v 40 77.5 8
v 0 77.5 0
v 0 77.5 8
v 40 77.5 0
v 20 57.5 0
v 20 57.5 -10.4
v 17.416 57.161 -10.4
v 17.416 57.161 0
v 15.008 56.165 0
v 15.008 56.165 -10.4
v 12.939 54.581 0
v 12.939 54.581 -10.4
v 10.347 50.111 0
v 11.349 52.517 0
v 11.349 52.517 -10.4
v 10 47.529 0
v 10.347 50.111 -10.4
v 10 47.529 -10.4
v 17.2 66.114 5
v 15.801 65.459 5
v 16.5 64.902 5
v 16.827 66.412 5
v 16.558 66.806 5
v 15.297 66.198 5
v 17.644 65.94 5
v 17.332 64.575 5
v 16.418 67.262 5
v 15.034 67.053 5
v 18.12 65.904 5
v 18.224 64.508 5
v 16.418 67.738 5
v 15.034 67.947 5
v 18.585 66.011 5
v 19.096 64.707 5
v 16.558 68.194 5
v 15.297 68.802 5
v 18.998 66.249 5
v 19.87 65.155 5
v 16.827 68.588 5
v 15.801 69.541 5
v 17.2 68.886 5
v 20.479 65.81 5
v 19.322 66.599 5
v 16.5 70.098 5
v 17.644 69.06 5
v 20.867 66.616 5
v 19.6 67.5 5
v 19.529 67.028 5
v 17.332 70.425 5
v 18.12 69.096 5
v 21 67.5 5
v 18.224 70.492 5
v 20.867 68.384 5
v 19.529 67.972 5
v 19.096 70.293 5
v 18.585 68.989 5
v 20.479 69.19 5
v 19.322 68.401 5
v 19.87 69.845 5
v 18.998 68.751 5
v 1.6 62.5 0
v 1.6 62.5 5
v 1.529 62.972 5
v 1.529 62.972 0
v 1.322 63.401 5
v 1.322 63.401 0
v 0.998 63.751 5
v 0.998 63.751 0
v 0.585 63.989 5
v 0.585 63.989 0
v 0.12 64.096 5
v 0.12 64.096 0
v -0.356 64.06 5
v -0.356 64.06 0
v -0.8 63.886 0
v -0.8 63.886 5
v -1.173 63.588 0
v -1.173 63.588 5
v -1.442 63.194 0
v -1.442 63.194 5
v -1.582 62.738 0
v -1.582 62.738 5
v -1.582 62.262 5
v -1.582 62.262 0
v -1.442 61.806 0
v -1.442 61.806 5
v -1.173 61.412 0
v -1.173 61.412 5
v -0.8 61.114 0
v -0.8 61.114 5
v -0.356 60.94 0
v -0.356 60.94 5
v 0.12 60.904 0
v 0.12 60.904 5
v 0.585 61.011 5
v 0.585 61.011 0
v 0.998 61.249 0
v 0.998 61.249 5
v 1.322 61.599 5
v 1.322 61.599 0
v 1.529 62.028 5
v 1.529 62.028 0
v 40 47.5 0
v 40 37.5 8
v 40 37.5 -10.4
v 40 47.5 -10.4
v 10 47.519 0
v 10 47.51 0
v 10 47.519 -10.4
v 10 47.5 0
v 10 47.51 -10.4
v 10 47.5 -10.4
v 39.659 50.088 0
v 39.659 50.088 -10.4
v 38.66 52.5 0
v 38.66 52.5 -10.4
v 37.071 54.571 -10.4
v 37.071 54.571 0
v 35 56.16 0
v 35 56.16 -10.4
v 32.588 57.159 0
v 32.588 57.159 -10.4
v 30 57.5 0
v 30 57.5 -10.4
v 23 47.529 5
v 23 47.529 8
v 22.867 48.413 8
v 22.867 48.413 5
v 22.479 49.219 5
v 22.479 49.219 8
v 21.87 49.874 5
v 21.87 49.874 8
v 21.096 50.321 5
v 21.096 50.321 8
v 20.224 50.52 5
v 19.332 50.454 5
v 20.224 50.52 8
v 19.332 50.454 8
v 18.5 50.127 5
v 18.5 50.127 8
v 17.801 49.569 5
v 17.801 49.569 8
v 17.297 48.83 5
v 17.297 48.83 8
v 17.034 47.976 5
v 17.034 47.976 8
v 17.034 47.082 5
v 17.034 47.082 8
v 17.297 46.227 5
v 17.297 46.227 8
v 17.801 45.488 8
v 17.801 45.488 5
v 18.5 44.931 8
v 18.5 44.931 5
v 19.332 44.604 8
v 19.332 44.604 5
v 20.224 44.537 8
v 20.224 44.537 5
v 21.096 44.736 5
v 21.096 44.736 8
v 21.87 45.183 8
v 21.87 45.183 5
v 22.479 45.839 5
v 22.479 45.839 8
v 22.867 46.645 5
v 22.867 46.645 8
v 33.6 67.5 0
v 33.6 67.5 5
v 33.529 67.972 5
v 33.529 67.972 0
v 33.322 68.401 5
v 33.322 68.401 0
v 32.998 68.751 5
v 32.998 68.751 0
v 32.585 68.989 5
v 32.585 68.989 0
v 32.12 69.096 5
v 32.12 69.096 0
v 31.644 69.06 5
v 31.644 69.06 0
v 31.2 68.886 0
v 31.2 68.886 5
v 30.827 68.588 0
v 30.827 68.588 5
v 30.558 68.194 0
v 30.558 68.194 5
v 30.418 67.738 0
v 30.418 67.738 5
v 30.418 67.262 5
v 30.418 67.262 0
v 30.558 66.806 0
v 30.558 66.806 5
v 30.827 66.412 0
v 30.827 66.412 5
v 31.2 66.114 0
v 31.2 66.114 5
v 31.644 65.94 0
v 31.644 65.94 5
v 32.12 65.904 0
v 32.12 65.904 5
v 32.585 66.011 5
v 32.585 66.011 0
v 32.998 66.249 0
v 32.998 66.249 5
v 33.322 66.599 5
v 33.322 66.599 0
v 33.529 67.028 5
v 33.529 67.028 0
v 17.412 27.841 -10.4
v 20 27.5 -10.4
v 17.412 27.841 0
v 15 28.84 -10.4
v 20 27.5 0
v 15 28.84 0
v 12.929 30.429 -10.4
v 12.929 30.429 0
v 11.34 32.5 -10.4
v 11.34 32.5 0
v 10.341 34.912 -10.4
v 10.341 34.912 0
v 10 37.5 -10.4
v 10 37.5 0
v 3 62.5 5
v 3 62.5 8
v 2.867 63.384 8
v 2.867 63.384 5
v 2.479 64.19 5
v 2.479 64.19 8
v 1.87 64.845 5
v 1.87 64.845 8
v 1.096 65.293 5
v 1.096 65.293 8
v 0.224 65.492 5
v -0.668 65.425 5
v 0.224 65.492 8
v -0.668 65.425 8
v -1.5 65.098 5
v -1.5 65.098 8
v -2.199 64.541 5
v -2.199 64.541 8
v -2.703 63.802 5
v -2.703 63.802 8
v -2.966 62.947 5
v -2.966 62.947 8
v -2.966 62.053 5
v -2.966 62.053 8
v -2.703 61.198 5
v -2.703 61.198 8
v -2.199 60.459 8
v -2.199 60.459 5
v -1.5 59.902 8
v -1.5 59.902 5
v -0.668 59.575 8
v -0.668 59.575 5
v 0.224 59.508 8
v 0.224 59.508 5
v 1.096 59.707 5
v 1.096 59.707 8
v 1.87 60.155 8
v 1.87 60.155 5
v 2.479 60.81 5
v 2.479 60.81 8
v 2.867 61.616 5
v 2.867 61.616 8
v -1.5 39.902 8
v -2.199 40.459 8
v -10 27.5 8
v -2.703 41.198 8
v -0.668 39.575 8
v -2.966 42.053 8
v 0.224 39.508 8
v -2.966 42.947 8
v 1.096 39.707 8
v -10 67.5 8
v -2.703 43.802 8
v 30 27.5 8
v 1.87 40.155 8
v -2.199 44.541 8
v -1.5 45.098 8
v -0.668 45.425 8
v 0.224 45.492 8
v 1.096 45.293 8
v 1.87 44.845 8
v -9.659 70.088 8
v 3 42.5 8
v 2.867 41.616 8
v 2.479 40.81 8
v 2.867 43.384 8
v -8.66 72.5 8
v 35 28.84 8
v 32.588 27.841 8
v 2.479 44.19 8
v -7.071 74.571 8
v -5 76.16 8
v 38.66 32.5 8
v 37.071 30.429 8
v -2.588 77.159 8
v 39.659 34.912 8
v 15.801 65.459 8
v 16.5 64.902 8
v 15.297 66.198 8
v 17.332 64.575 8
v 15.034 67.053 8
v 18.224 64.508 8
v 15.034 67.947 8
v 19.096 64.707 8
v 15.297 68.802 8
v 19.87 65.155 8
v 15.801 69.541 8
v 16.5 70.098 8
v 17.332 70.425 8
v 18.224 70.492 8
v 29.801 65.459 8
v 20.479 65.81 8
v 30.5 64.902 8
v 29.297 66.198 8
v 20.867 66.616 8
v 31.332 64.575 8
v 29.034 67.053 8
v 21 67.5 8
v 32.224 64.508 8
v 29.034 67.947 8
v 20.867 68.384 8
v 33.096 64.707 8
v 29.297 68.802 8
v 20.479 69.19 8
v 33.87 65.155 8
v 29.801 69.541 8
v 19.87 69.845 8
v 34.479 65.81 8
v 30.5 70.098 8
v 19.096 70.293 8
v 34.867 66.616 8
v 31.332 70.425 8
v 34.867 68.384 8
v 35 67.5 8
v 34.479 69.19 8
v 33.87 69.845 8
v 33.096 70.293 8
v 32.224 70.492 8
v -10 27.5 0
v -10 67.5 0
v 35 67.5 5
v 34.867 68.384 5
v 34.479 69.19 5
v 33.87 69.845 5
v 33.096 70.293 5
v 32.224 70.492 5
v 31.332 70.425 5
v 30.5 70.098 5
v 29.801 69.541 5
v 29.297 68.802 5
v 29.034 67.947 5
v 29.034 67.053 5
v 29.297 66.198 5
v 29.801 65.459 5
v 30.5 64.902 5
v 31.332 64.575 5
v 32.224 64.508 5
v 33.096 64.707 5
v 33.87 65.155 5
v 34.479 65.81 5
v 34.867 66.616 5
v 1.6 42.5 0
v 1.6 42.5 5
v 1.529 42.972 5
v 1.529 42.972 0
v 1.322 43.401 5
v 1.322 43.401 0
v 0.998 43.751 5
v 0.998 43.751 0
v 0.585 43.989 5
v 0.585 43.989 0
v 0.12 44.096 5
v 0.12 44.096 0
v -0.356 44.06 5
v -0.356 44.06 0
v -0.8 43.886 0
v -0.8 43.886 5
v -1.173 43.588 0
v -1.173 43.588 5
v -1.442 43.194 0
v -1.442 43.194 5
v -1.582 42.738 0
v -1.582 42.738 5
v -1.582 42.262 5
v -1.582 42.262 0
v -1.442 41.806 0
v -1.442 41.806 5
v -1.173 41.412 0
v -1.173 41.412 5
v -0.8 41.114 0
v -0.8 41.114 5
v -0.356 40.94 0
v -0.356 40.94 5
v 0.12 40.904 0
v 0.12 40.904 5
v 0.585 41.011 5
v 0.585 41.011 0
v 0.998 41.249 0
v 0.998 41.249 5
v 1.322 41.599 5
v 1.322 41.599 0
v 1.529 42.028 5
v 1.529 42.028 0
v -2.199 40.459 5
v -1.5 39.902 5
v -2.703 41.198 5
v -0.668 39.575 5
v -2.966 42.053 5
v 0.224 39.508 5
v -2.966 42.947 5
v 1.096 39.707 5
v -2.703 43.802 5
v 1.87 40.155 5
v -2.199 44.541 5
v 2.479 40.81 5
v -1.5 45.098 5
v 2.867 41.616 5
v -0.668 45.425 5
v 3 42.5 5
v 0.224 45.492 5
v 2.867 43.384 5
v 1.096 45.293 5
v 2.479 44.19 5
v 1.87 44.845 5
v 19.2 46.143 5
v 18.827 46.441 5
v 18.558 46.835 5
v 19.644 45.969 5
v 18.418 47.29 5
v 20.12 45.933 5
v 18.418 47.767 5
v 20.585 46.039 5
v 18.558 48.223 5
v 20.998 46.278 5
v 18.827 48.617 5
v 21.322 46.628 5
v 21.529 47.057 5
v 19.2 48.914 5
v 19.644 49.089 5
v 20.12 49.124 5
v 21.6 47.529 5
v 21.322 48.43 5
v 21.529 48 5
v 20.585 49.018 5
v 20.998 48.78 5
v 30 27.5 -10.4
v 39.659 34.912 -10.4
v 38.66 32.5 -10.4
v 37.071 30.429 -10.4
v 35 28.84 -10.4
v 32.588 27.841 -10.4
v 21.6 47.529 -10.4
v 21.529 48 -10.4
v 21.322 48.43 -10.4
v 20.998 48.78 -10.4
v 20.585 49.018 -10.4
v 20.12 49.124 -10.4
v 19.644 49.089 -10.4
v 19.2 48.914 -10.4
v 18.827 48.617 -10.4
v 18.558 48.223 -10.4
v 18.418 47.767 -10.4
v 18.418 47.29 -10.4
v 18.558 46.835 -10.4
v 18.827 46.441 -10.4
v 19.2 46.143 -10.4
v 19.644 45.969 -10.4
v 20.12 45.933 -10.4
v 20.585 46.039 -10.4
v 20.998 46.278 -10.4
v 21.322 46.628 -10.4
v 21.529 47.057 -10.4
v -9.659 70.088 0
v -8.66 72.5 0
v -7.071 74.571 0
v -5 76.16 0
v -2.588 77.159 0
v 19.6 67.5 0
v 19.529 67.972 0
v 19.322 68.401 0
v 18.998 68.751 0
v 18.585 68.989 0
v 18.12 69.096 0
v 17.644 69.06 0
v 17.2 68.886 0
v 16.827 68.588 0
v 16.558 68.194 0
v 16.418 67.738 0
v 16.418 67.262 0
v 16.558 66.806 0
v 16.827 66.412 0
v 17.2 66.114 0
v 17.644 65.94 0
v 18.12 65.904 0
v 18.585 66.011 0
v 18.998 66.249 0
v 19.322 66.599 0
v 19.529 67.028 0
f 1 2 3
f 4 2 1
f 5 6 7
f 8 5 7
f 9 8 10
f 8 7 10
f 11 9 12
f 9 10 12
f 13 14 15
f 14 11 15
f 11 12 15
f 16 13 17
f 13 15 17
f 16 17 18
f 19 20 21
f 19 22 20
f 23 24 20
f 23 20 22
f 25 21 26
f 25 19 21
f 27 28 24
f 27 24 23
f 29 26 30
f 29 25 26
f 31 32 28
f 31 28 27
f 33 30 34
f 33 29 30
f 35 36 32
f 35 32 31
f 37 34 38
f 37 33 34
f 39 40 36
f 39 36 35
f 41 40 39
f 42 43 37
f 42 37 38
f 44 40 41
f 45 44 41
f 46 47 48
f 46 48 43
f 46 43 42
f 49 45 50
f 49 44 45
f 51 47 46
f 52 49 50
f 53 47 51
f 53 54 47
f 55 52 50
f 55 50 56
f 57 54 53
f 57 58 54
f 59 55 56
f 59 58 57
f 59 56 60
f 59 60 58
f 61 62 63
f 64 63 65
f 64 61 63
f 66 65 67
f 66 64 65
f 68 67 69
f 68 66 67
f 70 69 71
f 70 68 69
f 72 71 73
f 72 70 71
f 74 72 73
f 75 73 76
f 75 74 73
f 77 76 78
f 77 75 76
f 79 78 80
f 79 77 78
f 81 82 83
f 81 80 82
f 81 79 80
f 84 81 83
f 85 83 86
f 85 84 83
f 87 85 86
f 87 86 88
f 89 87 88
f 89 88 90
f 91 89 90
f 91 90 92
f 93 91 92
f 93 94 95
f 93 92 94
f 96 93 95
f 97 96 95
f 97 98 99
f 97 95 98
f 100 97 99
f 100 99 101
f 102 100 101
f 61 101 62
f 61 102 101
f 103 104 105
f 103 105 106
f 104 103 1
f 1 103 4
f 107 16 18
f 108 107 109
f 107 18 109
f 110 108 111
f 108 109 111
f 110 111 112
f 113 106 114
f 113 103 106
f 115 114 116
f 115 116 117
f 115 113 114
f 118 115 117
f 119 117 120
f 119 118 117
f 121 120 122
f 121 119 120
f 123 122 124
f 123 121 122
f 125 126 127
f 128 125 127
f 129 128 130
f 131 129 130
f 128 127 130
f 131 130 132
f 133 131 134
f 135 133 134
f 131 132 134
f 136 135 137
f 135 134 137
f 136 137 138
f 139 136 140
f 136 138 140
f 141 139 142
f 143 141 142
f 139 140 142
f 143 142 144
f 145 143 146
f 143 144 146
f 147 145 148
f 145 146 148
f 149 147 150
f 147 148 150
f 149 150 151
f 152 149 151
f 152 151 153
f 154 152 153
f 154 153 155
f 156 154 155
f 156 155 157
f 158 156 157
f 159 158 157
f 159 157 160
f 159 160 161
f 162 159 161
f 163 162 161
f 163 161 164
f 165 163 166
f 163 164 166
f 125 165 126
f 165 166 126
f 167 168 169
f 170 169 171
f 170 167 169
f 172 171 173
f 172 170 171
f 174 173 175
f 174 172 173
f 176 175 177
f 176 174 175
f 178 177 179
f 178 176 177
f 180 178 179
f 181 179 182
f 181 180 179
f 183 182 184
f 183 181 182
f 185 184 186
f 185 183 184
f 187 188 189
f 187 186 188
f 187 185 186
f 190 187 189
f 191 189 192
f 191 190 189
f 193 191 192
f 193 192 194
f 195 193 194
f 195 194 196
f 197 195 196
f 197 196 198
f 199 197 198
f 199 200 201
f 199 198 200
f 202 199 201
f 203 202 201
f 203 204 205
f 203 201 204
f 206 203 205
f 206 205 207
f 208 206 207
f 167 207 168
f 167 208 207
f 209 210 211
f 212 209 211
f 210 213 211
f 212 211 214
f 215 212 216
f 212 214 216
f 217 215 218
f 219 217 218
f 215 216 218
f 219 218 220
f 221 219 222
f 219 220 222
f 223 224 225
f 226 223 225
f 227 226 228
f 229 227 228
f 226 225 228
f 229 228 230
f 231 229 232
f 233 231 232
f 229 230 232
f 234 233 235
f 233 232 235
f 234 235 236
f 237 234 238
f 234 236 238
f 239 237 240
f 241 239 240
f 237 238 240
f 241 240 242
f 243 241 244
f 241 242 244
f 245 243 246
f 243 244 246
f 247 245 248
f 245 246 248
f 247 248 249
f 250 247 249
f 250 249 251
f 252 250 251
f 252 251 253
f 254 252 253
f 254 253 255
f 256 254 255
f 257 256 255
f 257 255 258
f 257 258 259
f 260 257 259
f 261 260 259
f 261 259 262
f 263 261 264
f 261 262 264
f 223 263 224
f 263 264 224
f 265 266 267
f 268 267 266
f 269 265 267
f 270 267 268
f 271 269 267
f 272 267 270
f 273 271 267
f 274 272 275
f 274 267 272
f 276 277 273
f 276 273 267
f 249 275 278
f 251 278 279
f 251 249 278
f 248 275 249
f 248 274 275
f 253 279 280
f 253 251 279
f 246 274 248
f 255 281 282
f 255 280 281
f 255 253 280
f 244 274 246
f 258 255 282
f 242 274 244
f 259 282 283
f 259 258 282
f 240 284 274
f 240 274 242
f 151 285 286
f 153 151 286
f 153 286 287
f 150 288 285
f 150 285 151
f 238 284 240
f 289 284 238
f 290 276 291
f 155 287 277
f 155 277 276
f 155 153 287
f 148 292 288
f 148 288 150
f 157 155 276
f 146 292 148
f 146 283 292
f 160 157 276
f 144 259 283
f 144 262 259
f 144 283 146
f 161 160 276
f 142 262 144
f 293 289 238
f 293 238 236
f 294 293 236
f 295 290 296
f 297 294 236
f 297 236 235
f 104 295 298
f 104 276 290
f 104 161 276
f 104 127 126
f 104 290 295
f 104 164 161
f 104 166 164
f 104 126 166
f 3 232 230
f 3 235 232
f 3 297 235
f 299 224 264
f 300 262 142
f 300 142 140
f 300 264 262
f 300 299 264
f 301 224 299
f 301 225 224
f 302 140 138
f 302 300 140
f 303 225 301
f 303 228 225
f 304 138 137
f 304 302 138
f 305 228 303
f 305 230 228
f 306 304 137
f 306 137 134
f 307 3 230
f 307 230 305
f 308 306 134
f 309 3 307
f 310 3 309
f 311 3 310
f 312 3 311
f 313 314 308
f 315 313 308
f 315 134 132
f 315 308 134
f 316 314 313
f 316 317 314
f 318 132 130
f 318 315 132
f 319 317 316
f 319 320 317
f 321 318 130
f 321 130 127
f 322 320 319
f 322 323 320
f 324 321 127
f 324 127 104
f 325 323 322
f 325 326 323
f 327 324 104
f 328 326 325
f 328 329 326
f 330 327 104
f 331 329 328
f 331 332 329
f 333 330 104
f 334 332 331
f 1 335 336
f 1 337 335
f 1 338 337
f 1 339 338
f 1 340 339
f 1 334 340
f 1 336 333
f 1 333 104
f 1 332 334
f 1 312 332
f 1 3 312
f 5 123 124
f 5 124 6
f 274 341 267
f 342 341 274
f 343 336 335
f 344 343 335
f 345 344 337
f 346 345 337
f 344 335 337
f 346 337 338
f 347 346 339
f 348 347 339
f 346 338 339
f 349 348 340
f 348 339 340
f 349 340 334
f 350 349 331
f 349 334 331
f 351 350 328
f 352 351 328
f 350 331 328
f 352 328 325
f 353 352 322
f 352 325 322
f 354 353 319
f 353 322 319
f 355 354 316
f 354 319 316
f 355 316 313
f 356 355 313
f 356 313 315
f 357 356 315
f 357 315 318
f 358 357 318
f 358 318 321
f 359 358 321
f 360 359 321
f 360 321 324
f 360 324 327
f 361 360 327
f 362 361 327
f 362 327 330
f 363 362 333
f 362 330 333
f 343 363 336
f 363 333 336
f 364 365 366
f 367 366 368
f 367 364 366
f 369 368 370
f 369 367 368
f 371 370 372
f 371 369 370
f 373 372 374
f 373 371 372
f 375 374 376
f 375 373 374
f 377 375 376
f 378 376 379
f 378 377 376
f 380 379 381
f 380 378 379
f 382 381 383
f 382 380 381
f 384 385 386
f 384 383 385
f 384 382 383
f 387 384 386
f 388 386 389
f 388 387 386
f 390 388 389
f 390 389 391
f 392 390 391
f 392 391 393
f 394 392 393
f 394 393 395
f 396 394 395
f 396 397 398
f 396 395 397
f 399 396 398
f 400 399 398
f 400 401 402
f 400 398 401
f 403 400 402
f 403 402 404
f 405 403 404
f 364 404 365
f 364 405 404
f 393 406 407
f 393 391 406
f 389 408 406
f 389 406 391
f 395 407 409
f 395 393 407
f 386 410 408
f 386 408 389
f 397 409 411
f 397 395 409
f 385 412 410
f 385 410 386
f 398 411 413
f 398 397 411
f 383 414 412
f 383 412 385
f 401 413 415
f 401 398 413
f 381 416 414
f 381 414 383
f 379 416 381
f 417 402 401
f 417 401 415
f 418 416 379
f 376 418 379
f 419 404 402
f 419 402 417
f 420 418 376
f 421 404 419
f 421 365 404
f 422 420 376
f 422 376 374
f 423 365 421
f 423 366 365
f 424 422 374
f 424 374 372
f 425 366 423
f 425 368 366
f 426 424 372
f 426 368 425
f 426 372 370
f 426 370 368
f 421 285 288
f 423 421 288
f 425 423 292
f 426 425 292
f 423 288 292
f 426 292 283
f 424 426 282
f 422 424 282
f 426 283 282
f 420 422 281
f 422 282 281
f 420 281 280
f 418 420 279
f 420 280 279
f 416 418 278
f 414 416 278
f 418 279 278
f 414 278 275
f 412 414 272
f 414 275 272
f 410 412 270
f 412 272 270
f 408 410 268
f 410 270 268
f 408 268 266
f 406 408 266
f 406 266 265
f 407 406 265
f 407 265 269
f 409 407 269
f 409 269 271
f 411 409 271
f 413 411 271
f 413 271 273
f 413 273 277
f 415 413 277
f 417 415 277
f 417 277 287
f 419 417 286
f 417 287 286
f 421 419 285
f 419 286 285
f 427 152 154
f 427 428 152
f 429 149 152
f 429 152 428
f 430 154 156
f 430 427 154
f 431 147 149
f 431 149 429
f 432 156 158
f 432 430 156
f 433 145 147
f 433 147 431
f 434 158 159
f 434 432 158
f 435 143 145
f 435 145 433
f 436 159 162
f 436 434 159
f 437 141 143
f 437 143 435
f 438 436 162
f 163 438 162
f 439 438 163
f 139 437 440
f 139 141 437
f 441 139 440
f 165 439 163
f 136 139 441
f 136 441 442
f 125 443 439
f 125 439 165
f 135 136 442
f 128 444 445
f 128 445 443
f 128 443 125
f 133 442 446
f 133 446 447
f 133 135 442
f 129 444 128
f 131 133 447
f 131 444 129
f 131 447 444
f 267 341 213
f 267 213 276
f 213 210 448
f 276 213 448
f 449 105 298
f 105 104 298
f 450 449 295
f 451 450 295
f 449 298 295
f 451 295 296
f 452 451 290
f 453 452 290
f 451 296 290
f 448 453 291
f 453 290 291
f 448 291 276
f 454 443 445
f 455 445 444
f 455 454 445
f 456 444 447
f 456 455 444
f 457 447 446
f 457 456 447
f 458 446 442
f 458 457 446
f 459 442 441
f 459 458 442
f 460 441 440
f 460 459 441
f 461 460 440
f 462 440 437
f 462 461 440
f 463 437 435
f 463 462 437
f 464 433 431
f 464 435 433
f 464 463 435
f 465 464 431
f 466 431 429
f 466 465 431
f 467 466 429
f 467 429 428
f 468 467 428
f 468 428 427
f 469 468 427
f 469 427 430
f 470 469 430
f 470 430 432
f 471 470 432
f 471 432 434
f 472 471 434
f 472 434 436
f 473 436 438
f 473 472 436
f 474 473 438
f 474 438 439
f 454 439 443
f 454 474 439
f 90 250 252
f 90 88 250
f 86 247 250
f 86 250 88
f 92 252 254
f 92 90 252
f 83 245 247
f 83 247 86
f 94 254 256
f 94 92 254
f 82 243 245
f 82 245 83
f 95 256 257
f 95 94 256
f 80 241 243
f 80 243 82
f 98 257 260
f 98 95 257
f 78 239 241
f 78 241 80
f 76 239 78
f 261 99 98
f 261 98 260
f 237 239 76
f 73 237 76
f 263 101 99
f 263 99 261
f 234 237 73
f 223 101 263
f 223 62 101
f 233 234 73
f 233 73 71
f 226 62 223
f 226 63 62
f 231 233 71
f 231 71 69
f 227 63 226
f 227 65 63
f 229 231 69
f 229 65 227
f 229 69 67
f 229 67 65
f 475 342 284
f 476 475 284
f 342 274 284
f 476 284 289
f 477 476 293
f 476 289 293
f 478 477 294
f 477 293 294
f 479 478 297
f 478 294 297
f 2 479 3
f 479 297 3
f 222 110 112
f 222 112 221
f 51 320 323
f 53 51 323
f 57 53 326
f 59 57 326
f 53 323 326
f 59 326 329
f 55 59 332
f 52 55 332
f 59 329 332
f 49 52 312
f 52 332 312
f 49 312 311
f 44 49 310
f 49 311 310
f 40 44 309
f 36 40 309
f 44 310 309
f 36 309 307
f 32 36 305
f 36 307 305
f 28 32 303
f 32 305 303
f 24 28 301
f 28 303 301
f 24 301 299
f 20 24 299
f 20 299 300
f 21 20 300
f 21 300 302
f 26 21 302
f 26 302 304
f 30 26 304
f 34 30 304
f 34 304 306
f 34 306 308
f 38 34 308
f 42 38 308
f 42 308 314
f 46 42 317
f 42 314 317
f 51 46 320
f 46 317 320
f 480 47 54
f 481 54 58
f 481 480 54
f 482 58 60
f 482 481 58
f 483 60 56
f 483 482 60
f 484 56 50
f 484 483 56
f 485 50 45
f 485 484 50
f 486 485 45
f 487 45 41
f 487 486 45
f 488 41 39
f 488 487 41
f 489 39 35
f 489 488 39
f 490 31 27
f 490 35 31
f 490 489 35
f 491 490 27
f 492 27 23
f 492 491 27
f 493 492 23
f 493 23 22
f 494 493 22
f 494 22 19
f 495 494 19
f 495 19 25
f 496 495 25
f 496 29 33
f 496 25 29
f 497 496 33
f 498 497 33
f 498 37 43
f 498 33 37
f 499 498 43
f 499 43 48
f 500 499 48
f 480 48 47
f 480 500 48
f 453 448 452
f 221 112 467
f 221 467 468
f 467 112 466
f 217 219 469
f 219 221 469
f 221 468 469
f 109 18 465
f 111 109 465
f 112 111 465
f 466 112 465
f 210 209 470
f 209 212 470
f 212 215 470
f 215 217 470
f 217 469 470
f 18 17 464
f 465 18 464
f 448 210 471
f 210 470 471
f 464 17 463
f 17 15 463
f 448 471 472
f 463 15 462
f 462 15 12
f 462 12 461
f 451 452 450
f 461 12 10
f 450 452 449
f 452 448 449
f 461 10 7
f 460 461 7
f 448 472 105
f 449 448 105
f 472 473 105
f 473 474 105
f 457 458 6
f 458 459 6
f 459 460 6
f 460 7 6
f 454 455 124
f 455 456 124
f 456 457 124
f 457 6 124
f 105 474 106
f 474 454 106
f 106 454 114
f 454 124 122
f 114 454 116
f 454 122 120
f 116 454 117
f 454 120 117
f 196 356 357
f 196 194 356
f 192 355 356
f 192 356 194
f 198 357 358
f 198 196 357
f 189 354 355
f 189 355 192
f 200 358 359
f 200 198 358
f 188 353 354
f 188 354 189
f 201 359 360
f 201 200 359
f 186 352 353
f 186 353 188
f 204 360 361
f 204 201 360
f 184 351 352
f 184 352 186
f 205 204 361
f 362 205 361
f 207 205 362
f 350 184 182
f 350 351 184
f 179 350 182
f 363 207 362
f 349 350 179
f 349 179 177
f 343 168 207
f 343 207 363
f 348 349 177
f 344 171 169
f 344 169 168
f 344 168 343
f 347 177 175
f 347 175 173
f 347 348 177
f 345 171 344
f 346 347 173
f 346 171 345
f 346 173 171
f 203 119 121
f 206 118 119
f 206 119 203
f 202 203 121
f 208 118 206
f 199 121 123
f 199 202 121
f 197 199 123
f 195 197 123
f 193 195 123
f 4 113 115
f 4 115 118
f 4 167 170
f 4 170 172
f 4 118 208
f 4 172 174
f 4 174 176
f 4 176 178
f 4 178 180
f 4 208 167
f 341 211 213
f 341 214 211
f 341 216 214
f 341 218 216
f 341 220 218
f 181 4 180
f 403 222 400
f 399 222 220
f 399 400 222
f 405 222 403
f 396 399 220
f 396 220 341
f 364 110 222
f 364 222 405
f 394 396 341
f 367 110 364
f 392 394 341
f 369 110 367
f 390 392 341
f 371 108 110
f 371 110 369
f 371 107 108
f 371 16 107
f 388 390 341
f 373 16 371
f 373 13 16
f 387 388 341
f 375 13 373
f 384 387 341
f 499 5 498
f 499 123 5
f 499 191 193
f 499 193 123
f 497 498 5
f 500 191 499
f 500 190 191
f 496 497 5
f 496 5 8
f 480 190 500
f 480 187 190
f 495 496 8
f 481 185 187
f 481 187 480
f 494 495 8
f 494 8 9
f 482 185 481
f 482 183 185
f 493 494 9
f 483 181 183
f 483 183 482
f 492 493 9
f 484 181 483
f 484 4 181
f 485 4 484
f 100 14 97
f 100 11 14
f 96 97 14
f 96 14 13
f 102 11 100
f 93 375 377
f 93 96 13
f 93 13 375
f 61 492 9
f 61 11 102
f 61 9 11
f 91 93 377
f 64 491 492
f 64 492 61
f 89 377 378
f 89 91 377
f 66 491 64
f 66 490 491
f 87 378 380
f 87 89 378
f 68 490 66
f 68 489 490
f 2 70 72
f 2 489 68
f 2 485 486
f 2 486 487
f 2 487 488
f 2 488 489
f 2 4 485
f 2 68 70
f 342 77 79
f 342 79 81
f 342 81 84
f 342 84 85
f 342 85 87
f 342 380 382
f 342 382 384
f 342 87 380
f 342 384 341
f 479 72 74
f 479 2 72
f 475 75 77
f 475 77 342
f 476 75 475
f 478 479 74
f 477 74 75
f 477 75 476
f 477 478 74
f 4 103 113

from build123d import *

# Parameters (mm, degrees)
SKETCH_1_R          = 1.6
EXTRUDE_1_DEPTH     = 8
SKETCH_2_R          = 3
CUT_EXTRUDE_1_DEPTH = 3
FILLET_1_R          = 10
EXTRUDE_START       = -18.399949
SKETCH_3_R          = 1.6
EXTRUDE_2_DEPTH     = 18.399949
SKETCH_5_R          = 3
CUT_EXTRUDE_2_DEPTH = 3
FILLET_2_R          = 10


with BuildPart() as part:
    # 草图1 → 凸台-拉伸1 (new body)
    with BuildSketch(Plane.XY):
        Polygon((10, 57.5), (10, 27.5), (-10, 27.5), (-10, 77.5), (40, 77.5), (40, 57.5), align=None)
        with Locations((32, 67.5)):
            Circle(SKETCH_1_R, mode=Mode.SUBTRACT)
        with Locations((18, 67.5)):
            Circle(SKETCH_1_R, mode=Mode.SUBTRACT)
        with Locations((0, 62.5)):
            Circle(SKETCH_1_R, mode=Mode.SUBTRACT)
        with Locations((0, 42.5)):
            Circle(SKETCH_1_R, mode=Mode.SUBTRACT)
    extrude(amount=EXTRUDE_1_DEPTH)

    # 草图2 → 切除-拉伸1 (cut)
    with BuildSketch(Plane.XY.offset(8)):
        with Locations((32, 67.5)):
            Circle(SKETCH_2_R)
        with Locations((18, 67.5)):
            Circle(SKETCH_2_R)
        with Locations((0, 62.5)):
            Circle(SKETCH_2_R)
        with Locations((0, 42.5)):
            Circle(SKETCH_2_R)
    extrude(amount=-CUT_EXTRUDE_1_DEPTH, mode=Mode.SUBTRACT)

    # 圆角1
    fillet_1_edges = [part.edges().sort_by_distance(p)[0] for p in [
        (-10, 77.5, 4),
        (10, 57.5, 4),
    ]]
    fillet(fillet_1_edges, radius=FILLET_1_R)

    # 草图3 → 凸台-拉伸2 (add)
    with BuildSketch(Plane.XY.offset(8).offset(EXTRUDE_START)):
        with BuildLine():
            Line((40, 27.5), (40, 57.5))
            Line((40, 57.5), (20, 57.5))
            ThreePointArc((20, 57.5), (12.939135643, 54.581256565), (10.000041584, 47.528838907))
            ThreePointArc((10.000041584, 47.528838907), (10.000010396, 47.514419468), (10, 47.5))
            Line((10, 47.5), (10, 27.5))
            Line((10, 27.5), (40, 27.5))
        make_face()
        with Locations((20, 47.528839027)):
            Circle(SKETCH_3_R, mode=Mode.SUBTRACT)
    extrude(amount=EXTRUDE_2_DEPTH)

    # 草图5 → 切除-拉伸2 (cut)
    with BuildSketch(Plane.XY.offset(8)):
        with Locations((20, 47.528839027)):
            Circle(SKETCH_5_R)
    extrude(amount=-CUT_EXTRUDE_2_DEPTH, mode=Mode.SUBTRACT)

    # 圆角2
    fillet_2_edges = [part.edges().sort_by_distance(p)[0] for p in [
        (40, 57.5, -5.1999745),
        (10, 27.5, -5.1999745),
        (40, 27.5, -1.1999745),
    ]]
    fillet(fillet_2_edges, radius=FILLET_2_R)


solid = part.part
